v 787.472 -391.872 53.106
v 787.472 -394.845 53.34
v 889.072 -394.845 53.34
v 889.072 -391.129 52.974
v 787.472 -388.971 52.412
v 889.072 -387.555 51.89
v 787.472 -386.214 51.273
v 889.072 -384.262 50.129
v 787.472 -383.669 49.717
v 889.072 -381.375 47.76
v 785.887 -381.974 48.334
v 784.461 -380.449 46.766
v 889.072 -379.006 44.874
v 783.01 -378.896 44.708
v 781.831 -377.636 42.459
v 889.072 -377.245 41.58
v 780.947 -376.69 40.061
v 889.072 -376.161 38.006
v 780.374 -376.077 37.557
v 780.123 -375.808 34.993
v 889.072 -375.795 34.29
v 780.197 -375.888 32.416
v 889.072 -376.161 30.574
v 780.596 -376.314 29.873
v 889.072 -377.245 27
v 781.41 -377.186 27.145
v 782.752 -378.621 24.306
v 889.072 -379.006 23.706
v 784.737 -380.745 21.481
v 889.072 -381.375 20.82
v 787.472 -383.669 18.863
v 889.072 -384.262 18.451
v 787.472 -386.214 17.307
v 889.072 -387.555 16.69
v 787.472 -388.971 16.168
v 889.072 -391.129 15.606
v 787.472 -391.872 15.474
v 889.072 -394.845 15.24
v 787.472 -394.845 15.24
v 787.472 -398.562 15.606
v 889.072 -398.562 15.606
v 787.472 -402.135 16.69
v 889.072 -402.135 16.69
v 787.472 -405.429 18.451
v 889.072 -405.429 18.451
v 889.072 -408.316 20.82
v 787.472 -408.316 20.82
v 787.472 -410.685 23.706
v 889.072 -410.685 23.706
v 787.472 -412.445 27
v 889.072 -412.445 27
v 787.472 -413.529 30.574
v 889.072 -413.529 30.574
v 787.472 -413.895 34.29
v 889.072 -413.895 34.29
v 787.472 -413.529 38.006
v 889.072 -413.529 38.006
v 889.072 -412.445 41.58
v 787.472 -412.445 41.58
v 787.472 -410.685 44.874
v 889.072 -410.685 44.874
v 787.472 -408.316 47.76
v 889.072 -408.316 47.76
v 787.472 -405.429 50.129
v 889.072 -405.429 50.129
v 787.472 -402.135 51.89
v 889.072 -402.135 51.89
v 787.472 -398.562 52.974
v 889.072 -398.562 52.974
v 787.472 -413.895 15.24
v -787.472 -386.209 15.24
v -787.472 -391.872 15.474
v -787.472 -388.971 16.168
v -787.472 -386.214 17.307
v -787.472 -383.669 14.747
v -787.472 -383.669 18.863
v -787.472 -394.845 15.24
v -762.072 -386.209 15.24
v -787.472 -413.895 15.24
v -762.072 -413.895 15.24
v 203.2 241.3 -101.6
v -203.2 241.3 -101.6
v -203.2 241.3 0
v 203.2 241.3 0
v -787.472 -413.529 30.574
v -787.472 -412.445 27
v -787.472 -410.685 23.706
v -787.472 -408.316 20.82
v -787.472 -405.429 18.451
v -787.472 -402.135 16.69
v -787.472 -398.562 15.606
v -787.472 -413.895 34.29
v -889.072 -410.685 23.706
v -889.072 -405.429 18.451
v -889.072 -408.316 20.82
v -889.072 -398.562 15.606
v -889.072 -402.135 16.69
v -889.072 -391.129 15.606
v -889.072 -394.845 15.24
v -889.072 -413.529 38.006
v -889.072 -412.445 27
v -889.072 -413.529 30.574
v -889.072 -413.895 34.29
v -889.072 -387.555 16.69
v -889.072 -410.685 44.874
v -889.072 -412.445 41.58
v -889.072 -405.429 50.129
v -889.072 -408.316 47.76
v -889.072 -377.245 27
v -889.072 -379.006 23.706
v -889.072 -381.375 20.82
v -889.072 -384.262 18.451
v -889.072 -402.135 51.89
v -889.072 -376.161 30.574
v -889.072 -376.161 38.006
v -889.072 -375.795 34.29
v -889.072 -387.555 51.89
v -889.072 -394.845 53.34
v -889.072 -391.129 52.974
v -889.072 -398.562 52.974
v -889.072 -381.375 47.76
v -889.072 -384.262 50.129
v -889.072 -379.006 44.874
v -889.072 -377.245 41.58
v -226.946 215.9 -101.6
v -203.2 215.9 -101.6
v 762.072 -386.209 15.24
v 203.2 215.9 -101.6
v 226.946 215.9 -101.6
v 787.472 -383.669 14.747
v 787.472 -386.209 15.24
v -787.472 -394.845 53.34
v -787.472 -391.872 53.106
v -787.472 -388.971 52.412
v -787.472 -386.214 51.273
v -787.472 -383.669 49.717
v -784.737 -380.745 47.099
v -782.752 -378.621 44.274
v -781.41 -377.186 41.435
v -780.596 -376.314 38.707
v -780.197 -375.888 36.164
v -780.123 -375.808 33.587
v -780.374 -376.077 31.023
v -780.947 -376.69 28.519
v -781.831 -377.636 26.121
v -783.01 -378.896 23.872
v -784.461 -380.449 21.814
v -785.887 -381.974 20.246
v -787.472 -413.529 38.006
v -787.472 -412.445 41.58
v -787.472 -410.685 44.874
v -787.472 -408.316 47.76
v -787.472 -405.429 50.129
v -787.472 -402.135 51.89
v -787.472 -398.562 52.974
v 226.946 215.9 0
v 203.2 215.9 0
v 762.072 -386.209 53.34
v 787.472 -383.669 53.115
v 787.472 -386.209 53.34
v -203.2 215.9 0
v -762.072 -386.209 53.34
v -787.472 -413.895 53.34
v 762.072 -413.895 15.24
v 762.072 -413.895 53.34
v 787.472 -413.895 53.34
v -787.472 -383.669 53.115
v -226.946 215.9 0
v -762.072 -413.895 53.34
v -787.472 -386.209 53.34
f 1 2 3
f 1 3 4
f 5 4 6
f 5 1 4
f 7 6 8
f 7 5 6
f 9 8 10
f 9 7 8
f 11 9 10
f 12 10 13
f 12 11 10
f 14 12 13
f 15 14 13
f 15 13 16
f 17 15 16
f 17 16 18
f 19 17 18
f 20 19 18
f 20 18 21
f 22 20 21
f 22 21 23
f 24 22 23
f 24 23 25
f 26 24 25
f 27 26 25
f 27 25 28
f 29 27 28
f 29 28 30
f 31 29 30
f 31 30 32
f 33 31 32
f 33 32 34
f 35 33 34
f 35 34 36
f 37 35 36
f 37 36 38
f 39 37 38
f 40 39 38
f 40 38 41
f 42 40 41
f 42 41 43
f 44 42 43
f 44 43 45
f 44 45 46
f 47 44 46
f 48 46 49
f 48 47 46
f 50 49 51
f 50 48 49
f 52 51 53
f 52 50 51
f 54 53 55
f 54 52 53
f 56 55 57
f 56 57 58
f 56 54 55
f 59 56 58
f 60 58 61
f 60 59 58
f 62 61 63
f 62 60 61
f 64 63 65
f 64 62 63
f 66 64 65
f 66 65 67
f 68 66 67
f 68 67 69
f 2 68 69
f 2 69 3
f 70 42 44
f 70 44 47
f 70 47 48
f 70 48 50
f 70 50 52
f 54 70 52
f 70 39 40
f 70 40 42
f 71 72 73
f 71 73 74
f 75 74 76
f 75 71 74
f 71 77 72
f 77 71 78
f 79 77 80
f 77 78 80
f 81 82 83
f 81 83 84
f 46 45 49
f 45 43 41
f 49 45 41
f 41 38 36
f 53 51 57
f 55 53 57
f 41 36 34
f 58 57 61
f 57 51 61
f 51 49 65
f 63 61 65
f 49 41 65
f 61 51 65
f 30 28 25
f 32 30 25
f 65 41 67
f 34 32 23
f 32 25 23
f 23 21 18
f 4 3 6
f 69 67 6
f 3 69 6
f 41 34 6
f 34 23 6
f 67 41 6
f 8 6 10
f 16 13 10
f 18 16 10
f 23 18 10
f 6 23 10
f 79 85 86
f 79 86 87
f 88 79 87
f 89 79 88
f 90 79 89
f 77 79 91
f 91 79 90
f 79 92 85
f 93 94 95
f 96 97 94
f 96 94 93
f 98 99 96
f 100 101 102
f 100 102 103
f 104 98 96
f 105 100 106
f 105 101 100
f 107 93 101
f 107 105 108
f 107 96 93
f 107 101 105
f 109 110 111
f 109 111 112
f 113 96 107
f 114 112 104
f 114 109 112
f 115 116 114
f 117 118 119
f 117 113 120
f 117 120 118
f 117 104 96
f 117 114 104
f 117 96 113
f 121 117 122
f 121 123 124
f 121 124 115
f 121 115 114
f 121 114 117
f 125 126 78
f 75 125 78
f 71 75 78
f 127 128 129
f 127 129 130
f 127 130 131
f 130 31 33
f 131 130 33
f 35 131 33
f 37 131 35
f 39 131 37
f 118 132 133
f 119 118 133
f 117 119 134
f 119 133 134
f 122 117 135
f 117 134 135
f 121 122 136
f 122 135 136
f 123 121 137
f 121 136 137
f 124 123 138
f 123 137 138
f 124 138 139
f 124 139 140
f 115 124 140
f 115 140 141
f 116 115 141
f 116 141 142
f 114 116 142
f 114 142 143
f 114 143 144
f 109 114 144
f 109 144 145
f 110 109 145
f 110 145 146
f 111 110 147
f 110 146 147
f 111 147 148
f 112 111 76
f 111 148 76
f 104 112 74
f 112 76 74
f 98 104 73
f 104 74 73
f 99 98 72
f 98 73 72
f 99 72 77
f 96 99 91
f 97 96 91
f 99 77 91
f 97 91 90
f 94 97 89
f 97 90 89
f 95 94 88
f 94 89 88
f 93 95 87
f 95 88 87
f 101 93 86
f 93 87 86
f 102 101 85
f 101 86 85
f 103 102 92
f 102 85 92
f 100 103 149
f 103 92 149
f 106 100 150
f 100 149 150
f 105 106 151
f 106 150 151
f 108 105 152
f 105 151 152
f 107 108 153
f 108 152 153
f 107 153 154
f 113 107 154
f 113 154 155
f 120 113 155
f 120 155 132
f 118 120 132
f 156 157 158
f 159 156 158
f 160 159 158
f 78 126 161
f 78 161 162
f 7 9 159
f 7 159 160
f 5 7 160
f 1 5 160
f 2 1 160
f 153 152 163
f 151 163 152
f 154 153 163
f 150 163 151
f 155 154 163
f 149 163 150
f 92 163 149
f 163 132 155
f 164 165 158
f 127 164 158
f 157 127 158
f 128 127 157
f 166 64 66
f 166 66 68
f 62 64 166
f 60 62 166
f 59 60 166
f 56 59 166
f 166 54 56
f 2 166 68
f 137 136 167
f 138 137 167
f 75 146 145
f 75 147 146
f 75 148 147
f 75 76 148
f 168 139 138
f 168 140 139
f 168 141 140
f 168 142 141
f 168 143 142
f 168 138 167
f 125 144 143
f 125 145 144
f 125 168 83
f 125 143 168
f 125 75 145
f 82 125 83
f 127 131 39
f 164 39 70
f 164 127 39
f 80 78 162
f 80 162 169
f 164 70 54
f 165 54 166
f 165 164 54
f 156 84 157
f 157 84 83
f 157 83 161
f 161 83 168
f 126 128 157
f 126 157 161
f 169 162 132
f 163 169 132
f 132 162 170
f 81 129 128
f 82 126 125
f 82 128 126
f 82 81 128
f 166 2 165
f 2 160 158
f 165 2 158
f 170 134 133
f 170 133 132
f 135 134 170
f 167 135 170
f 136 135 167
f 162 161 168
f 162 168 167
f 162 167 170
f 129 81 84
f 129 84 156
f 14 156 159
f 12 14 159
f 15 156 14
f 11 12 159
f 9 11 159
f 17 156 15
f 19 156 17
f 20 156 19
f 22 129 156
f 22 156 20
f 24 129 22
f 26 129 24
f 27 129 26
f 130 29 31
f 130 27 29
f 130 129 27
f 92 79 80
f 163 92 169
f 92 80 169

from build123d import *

# Parameters (mm, degrees)
BOSS_EXTRUDE6_DEPTH            = 53.34
BOSS_EXTRUDE6_DEPTH_BACK       = 101.6
CUT_EXTRUDE8_REACH             = 902.262
CUT_EXTRUDE8_DIRECTION_2_REACH = 902.262
SKETCH15_R                     = 19.05
BOSS_EXTRUDE8_DEPTH            = 127
CUT_EXTRUDE9_REACH             = 1709.816
SKETCH16_W                     = 38.1
SKETCH16_H                     = 10.414
CUT_EXTRUDE9_DIRECTION_2_REACH = 1709.816


with BuildPart() as part:
    # Sketch12 → Boss-Extrude6 (new, two sides: drawn at the far end of the back side and taken through both)
    with BuildSketch(Plane.XY.offset(-BOSS_EXTRUDE6_DEPTH_BACK)):
        Polygon((-203.2, 241.3), (203.2, 241.3), (787.471663752, -383.669201703), (787.471663752, -424.309201703), (762.071663752, -424.309201703), (762.071663752, -386.209201703), (203.2, 215.9), (-203.2, 215.9), (-762.071663752, -386.209201703), (-762.071663752, -424.309201703), (-787.471663752, -424.309201703), (-787.471663752, -383.669201703), align=None)
    extrude(amount=BOSS_EXTRUDE6_DEPTH + BOSS_EXTRUDE6_DEPTH_BACK)

    # Cut-Extrude8: up to this plane
    cut_extrude8_end = Plane(origin=(-203.2, 241.3, -101.6), z_dir=(-0.7304911811601322, 0.6829221289775833, 0))
    # Sketch14 → Cut-Extrude8 (cut, up to the surface)
    with BuildSketch(Plane(origin=(0, 0, 0), x_dir=(0, 0, -1), z_dir=(1, 0, 0)), mode=Mode.PRIVATE) as cut_extrude8_sk1:
        Polygon((0, 241.3), (0, 215.9), (-53.34, -386.209201703), (-53.34, 241.3), align=None)
    cut_extrude8_tool1 = split(extrude(cut_extrude8_sk1.sketch, amount=-CUT_EXTRUDE8_REACH, mode=Mode.PRIVATE), bisect_by=cut_extrude8_end, keep=Keep.BOTH, mode=Mode.PRIVATE)
    add(cut_extrude8_tool1.solids().sort_by_distance((0, 31.800889, 34.868308))[0], mode=Mode.SUBTRACT)
    # Sketch14 → Cut-Extrude8 (cut, up to the surface)
    with BuildSketch(Plane(origin=(0, 0, 0), x_dir=(0, 0, -1), z_dir=(1, 0, 0)), mode=Mode.PRIVATE) as cut_extrude8_sk2:
        Polygon((101.6, 215.9), (-15.24, -386.209201703), (-15.24, -424.309201703), (101.6, -424.309201703), align=None)
    cut_extrude8_tool2 = split(extrude(cut_extrude8_sk2.sketch, amount=-CUT_EXTRUDE8_REACH, mode=Mode.PRIVATE), bisect_by=cut_extrude8_end, keep=Keep.BOTH, mode=Mode.PRIVATE)
    add(cut_extrude8_tool2.solids().sort_by_distance((0, -210.192787, -60.465735))[0], mode=Mode.SUBTRACT)

    # Cut-Extrude8 direction 2: up to this plane
    cut_extrude8_direction_2_end = Plane(origin=(203.2, 241.3, -101.6), z_dir=(0.7304911811601321, 0.6829221289775835, 0))
    # Sketch14 → Cut-Extrude8 direction 2 (cut, up to the surface)
    with BuildSketch(Plane(origin=(0, 0, 0), x_dir=(0, 0, -1), z_dir=(1, 0, 0)), mode=Mode.PRIVATE) as cut_extrude8_direction_2_sk1:
        Polygon((0, 241.3), (0, 215.9), (-53.34, -386.209201703), (-53.34, 241.3), align=None)
    cut_extrude8_direction_2_tool1 = split(extrude(cut_extrude8_direction_2_sk1.sketch, amount=CUT_EXTRUDE8_DIRECTION_2_REACH, mode=Mode.PRIVATE), bisect_by=cut_extrude8_direction_2_end, keep=Keep.BOTH, mode=Mode.PRIVATE)
    add(cut_extrude8_direction_2_tool1.solids().sort_by_distance((0, 31.800889, 34.868308))[0], mode=Mode.SUBTRACT)
    # Sketch14 → Cut-Extrude8 direction 2 (cut, up to the surface)
    with BuildSketch(Plane(origin=(0, 0, 0), x_dir=(0, 0, -1), z_dir=(1, 0, 0)), mode=Mode.PRIVATE) as cut_extrude8_direction_2_sk2:
        Polygon((101.6, 215.9), (-15.24, -386.209201703), (-15.24, -424.309201703), (101.6, -424.309201703), align=None)
    cut_extrude8_direction_2_tool2 = split(extrude(cut_extrude8_direction_2_sk2.sketch, amount=CUT_EXTRUDE8_DIRECTION_2_REACH, mode=Mode.PRIVATE), bisect_by=cut_extrude8_direction_2_end, keep=Keep.BOTH, mode=Mode.PRIVATE)
    add(cut_extrude8_direction_2_tool2.solids().sort_by_distance((0, -210.192787, -60.465735))[0], mode=Mode.SUBTRACT)

    # Sketch15 → Boss-Extrude8 (add)
    with BuildSketch(Plane.ZY.offset(762.071663752)):
        with Locations((34.29, -394.845201703)):
            Circle(SKETCH15_R)
    boss_extrude8 = extrude(amount=BOSS_EXTRUDE8_DEPTH)

    # Mirror2: Boss-Extrude8 across plane
    add(boss_extrude8.mirror(Plane(origin=(0, 0, 0), x_dir=(0, 0, 1), z_dir=(1, 0, 0))))

    # Cut-Extrude9: up to this face of the body (flat: up to its plane)
    cut_extrude9_end = Plane(part.part.faces().sort_by_distance((-787.471663752, -416.434815963, 34.29))[0])
    # Sketch16 → Cut-Extrude9 (cut, up to the picked face)
    with BuildSketch(Plane.ZY.offset(762.071663752), mode=Mode.PRIVATE) as cut_extrude9_sk1:
        with Locations((34.29, -419.102201703)):
            Rectangle(SKETCH16_W, SKETCH16_H)
    cut_extrude9_tool1 = split(extrude(cut_extrude9_sk1.sketch, amount=CUT_EXTRUDE9_REACH, mode=Mode.PRIVATE), bisect_by=cut_extrude9_end, keep=Keep.BOTH, mode=Mode.PRIVATE)
    add(cut_extrude9_tool1.solids().sort_by(Axis((-762.071664, -419.102202, 34.29), (-1, 0, 0)))[0], mode=Mode.SUBTRACT)

    # Cut-Extrude9 direction 2: up to this face of the body (flat: up to its plane)
    cut_extrude9_direction_2_end = Plane(part.part.faces().sort_by_distance((787.471663752, -416.434815963, 34.29))[0])
    # Sketch16 → Cut-Extrude9 direction 2 (cut, up to the picked face)
    with BuildSketch(Plane.ZY.offset(762.071663752), mode=Mode.PRIVATE) as cut_extrude9_direction_2_sk1:
        with Locations((34.29, -419.102201703)):
            Rectangle(SKETCH16_W, SKETCH16_H)
    cut_extrude9_direction_2_tool1 = split(extrude(cut_extrude9_direction_2_sk1.sketch, amount=-CUT_EXTRUDE9_DIRECTION_2_REACH, mode=Mode.PRIVATE), bisect_by=cut_extrude9_direction_2_end, keep=Keep.BOTH, mode=Mode.PRIVATE)
    add(cut_extrude9_direction_2_tool1.solids().sort_by(Axis((-762.071664, -419.102202, 34.29), (1, 0, 0)))[0], mode=Mode.SUBTRACT)


solid = part.part
